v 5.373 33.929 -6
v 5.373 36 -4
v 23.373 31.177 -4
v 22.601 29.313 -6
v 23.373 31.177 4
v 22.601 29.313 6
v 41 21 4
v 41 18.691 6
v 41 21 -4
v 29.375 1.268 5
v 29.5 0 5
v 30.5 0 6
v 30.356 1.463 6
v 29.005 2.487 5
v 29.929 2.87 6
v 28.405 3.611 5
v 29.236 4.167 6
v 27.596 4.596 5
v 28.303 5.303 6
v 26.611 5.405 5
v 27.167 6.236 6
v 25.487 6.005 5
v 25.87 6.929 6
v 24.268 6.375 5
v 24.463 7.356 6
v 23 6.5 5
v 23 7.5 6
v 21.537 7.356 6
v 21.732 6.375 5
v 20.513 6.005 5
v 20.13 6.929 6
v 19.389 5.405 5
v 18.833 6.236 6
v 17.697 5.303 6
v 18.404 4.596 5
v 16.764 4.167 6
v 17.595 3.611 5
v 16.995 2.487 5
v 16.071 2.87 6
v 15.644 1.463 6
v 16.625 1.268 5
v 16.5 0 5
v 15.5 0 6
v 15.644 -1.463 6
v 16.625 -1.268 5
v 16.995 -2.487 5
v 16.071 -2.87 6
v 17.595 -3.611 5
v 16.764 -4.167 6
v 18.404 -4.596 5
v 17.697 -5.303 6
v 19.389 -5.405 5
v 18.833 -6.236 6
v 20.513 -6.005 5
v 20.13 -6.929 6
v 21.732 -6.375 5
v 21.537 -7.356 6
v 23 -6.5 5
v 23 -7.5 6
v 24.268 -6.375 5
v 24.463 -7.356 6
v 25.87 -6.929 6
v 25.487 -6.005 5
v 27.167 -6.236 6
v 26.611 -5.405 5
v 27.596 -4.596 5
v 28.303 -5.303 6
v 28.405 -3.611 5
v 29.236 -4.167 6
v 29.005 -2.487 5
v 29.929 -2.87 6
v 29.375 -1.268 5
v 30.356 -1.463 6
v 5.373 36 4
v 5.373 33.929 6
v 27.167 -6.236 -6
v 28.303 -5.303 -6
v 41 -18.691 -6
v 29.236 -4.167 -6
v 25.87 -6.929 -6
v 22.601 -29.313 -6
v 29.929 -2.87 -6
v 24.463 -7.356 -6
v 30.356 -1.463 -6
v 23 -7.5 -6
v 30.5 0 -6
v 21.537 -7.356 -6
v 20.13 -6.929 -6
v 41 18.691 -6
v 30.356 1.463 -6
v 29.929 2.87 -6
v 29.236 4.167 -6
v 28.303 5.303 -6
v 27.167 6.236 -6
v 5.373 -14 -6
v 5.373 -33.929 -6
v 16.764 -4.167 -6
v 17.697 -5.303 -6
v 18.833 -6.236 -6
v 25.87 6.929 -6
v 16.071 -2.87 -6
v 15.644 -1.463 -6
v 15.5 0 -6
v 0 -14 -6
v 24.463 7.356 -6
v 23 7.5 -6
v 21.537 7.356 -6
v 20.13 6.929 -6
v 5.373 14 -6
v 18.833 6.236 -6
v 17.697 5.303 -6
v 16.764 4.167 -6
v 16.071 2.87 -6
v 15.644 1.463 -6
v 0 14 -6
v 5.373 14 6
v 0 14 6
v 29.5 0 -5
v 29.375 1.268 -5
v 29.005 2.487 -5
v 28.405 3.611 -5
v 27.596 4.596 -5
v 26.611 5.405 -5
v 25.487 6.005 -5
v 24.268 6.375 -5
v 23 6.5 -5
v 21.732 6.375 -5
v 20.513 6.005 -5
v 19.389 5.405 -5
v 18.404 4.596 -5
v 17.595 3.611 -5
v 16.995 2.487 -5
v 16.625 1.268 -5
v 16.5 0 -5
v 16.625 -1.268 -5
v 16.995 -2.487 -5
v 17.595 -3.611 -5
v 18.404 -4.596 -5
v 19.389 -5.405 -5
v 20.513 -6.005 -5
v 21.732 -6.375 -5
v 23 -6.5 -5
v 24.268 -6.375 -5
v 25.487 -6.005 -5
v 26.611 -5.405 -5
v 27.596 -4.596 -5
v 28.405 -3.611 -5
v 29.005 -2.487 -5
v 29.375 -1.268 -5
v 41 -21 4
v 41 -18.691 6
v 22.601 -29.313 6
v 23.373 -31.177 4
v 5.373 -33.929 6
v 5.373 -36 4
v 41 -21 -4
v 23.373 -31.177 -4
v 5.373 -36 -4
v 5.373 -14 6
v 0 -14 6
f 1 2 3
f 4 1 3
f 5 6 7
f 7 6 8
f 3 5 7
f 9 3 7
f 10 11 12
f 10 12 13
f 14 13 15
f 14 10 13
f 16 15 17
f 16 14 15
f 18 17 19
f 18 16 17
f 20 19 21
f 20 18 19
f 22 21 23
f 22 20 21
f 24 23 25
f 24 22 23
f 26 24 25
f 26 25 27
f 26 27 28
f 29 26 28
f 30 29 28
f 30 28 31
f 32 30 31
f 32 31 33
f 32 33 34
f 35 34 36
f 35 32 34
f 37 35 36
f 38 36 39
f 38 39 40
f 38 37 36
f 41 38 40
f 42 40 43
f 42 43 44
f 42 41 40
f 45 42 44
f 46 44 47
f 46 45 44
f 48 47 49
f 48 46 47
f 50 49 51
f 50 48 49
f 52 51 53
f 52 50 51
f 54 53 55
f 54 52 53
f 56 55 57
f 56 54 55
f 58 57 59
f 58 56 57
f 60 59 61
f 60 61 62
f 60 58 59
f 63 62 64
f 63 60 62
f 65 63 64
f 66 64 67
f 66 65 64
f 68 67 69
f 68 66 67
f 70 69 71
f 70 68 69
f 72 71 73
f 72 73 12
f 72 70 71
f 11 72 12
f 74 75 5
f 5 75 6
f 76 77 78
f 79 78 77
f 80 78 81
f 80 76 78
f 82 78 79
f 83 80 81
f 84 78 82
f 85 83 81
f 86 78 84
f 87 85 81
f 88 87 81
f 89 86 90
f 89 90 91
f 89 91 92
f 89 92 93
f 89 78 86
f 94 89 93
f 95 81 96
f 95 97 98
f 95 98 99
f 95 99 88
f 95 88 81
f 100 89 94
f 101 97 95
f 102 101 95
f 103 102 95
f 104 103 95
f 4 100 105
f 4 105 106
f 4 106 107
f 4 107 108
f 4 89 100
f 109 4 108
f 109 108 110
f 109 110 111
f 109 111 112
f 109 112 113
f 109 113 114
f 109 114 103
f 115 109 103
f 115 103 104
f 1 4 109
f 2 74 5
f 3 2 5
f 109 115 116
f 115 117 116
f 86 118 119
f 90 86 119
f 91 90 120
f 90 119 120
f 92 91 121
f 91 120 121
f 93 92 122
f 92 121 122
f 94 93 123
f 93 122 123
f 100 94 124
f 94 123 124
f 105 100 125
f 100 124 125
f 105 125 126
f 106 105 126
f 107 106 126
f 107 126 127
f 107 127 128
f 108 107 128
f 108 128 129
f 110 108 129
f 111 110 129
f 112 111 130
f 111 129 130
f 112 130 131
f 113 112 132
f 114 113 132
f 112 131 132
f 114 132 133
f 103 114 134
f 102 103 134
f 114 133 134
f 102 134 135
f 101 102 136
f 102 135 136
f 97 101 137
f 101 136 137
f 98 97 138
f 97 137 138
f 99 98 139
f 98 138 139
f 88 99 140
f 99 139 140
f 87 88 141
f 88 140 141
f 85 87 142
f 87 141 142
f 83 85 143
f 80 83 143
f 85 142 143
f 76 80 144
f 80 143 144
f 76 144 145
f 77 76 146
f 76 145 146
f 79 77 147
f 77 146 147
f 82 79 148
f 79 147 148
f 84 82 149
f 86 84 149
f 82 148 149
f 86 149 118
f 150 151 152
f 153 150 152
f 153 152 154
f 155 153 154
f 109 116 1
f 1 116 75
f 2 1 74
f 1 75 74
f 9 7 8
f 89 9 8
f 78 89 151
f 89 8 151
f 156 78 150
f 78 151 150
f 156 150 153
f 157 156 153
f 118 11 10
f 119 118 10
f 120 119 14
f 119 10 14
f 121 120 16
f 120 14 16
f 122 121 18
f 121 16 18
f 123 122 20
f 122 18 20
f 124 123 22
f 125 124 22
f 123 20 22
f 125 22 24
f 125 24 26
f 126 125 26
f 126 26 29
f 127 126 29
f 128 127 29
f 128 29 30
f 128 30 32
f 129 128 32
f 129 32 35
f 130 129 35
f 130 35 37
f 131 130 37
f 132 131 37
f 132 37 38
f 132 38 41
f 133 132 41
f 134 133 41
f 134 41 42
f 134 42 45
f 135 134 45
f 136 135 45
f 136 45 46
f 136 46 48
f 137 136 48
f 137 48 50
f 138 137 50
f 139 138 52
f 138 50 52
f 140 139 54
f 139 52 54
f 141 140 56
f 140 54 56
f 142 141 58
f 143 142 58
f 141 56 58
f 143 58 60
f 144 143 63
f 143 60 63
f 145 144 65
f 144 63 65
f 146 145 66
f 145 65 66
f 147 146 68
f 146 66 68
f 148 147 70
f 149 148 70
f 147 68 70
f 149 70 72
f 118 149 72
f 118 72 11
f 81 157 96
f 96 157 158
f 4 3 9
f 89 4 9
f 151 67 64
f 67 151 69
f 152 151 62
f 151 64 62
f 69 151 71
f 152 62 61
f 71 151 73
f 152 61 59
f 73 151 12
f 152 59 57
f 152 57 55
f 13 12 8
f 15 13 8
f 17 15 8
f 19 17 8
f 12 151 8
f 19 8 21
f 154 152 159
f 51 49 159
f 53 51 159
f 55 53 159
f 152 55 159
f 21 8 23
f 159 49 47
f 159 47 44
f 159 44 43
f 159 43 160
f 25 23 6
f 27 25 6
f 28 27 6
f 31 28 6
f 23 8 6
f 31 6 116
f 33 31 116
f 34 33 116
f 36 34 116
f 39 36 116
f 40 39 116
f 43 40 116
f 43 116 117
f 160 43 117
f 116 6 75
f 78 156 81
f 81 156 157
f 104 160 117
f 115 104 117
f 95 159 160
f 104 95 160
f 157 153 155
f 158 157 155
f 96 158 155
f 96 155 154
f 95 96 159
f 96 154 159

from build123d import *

# Parameters (mm, degrees)
EXTRUDE_1_DEPTH     = 6
SKETCH_2_R          = 6.5
CUT_EXTRUDE_1_DEPTH = 56.865910894
CHAMFER_1_SIZE      = 1
CHAMFER_2_SIZE      = 2


with BuildPart() as part:
    # 草图1 → 凸台-拉伸1 (new, symmetric)
    with BuildSketch(Plane.XY):
        Polygon((0, -14), (0, 14), (5.373066959, 14), (5.373066959, 36), (23.373066959, 31.176914536), (41, 21), (41, -21), (23.373066959, -31.176914536), (5.373066959, -36), (5.373066959, -14), align=None)
    extrude(amount=EXTRUDE_1_DEPTH, both=True)

    # 草图2 → 切除-拉伸1 (cut, through all)
    with BuildSketch(Plane.XY.offset(6)):
        with Locations((23, 0)):
            Circle(SKETCH_2_R)
    extrude(amount=-CUT_EXTRUDE_1_DEPTH, mode=Mode.SUBTRACT)

    # 倒角1
    chamfer_1_edges = [part.edges().sort_by_distance(p)[0] for p in [
        (16.5, 0, -6),
        (16.5, 0, 6),
    ]]
    chamfer(chamfer_1_edges, length=CHAMFER_1_SIZE)

    # 倒角2
    chamfer_2_edges = [part.edges().sort_by_distance(p)[0] for p in [
        (14.373066959, -33.588457268, -6),
        (14.373066959, 33.588457268, -6),
        (32.186533479, 26.088457268, 6),
        (32.186533479, 26.088457268, -6),
        (32.186533479, -26.088457268, -6),
        (14.373066959, 33.588457268, 6),
        (14.373066959, -33.588457268, 6),
        (32.186533479, -26.088457268, 6),
    ]]
    chamfer(chamfer_2_edges, length=CHAMFER_2_SIZE)


solid = part.part
